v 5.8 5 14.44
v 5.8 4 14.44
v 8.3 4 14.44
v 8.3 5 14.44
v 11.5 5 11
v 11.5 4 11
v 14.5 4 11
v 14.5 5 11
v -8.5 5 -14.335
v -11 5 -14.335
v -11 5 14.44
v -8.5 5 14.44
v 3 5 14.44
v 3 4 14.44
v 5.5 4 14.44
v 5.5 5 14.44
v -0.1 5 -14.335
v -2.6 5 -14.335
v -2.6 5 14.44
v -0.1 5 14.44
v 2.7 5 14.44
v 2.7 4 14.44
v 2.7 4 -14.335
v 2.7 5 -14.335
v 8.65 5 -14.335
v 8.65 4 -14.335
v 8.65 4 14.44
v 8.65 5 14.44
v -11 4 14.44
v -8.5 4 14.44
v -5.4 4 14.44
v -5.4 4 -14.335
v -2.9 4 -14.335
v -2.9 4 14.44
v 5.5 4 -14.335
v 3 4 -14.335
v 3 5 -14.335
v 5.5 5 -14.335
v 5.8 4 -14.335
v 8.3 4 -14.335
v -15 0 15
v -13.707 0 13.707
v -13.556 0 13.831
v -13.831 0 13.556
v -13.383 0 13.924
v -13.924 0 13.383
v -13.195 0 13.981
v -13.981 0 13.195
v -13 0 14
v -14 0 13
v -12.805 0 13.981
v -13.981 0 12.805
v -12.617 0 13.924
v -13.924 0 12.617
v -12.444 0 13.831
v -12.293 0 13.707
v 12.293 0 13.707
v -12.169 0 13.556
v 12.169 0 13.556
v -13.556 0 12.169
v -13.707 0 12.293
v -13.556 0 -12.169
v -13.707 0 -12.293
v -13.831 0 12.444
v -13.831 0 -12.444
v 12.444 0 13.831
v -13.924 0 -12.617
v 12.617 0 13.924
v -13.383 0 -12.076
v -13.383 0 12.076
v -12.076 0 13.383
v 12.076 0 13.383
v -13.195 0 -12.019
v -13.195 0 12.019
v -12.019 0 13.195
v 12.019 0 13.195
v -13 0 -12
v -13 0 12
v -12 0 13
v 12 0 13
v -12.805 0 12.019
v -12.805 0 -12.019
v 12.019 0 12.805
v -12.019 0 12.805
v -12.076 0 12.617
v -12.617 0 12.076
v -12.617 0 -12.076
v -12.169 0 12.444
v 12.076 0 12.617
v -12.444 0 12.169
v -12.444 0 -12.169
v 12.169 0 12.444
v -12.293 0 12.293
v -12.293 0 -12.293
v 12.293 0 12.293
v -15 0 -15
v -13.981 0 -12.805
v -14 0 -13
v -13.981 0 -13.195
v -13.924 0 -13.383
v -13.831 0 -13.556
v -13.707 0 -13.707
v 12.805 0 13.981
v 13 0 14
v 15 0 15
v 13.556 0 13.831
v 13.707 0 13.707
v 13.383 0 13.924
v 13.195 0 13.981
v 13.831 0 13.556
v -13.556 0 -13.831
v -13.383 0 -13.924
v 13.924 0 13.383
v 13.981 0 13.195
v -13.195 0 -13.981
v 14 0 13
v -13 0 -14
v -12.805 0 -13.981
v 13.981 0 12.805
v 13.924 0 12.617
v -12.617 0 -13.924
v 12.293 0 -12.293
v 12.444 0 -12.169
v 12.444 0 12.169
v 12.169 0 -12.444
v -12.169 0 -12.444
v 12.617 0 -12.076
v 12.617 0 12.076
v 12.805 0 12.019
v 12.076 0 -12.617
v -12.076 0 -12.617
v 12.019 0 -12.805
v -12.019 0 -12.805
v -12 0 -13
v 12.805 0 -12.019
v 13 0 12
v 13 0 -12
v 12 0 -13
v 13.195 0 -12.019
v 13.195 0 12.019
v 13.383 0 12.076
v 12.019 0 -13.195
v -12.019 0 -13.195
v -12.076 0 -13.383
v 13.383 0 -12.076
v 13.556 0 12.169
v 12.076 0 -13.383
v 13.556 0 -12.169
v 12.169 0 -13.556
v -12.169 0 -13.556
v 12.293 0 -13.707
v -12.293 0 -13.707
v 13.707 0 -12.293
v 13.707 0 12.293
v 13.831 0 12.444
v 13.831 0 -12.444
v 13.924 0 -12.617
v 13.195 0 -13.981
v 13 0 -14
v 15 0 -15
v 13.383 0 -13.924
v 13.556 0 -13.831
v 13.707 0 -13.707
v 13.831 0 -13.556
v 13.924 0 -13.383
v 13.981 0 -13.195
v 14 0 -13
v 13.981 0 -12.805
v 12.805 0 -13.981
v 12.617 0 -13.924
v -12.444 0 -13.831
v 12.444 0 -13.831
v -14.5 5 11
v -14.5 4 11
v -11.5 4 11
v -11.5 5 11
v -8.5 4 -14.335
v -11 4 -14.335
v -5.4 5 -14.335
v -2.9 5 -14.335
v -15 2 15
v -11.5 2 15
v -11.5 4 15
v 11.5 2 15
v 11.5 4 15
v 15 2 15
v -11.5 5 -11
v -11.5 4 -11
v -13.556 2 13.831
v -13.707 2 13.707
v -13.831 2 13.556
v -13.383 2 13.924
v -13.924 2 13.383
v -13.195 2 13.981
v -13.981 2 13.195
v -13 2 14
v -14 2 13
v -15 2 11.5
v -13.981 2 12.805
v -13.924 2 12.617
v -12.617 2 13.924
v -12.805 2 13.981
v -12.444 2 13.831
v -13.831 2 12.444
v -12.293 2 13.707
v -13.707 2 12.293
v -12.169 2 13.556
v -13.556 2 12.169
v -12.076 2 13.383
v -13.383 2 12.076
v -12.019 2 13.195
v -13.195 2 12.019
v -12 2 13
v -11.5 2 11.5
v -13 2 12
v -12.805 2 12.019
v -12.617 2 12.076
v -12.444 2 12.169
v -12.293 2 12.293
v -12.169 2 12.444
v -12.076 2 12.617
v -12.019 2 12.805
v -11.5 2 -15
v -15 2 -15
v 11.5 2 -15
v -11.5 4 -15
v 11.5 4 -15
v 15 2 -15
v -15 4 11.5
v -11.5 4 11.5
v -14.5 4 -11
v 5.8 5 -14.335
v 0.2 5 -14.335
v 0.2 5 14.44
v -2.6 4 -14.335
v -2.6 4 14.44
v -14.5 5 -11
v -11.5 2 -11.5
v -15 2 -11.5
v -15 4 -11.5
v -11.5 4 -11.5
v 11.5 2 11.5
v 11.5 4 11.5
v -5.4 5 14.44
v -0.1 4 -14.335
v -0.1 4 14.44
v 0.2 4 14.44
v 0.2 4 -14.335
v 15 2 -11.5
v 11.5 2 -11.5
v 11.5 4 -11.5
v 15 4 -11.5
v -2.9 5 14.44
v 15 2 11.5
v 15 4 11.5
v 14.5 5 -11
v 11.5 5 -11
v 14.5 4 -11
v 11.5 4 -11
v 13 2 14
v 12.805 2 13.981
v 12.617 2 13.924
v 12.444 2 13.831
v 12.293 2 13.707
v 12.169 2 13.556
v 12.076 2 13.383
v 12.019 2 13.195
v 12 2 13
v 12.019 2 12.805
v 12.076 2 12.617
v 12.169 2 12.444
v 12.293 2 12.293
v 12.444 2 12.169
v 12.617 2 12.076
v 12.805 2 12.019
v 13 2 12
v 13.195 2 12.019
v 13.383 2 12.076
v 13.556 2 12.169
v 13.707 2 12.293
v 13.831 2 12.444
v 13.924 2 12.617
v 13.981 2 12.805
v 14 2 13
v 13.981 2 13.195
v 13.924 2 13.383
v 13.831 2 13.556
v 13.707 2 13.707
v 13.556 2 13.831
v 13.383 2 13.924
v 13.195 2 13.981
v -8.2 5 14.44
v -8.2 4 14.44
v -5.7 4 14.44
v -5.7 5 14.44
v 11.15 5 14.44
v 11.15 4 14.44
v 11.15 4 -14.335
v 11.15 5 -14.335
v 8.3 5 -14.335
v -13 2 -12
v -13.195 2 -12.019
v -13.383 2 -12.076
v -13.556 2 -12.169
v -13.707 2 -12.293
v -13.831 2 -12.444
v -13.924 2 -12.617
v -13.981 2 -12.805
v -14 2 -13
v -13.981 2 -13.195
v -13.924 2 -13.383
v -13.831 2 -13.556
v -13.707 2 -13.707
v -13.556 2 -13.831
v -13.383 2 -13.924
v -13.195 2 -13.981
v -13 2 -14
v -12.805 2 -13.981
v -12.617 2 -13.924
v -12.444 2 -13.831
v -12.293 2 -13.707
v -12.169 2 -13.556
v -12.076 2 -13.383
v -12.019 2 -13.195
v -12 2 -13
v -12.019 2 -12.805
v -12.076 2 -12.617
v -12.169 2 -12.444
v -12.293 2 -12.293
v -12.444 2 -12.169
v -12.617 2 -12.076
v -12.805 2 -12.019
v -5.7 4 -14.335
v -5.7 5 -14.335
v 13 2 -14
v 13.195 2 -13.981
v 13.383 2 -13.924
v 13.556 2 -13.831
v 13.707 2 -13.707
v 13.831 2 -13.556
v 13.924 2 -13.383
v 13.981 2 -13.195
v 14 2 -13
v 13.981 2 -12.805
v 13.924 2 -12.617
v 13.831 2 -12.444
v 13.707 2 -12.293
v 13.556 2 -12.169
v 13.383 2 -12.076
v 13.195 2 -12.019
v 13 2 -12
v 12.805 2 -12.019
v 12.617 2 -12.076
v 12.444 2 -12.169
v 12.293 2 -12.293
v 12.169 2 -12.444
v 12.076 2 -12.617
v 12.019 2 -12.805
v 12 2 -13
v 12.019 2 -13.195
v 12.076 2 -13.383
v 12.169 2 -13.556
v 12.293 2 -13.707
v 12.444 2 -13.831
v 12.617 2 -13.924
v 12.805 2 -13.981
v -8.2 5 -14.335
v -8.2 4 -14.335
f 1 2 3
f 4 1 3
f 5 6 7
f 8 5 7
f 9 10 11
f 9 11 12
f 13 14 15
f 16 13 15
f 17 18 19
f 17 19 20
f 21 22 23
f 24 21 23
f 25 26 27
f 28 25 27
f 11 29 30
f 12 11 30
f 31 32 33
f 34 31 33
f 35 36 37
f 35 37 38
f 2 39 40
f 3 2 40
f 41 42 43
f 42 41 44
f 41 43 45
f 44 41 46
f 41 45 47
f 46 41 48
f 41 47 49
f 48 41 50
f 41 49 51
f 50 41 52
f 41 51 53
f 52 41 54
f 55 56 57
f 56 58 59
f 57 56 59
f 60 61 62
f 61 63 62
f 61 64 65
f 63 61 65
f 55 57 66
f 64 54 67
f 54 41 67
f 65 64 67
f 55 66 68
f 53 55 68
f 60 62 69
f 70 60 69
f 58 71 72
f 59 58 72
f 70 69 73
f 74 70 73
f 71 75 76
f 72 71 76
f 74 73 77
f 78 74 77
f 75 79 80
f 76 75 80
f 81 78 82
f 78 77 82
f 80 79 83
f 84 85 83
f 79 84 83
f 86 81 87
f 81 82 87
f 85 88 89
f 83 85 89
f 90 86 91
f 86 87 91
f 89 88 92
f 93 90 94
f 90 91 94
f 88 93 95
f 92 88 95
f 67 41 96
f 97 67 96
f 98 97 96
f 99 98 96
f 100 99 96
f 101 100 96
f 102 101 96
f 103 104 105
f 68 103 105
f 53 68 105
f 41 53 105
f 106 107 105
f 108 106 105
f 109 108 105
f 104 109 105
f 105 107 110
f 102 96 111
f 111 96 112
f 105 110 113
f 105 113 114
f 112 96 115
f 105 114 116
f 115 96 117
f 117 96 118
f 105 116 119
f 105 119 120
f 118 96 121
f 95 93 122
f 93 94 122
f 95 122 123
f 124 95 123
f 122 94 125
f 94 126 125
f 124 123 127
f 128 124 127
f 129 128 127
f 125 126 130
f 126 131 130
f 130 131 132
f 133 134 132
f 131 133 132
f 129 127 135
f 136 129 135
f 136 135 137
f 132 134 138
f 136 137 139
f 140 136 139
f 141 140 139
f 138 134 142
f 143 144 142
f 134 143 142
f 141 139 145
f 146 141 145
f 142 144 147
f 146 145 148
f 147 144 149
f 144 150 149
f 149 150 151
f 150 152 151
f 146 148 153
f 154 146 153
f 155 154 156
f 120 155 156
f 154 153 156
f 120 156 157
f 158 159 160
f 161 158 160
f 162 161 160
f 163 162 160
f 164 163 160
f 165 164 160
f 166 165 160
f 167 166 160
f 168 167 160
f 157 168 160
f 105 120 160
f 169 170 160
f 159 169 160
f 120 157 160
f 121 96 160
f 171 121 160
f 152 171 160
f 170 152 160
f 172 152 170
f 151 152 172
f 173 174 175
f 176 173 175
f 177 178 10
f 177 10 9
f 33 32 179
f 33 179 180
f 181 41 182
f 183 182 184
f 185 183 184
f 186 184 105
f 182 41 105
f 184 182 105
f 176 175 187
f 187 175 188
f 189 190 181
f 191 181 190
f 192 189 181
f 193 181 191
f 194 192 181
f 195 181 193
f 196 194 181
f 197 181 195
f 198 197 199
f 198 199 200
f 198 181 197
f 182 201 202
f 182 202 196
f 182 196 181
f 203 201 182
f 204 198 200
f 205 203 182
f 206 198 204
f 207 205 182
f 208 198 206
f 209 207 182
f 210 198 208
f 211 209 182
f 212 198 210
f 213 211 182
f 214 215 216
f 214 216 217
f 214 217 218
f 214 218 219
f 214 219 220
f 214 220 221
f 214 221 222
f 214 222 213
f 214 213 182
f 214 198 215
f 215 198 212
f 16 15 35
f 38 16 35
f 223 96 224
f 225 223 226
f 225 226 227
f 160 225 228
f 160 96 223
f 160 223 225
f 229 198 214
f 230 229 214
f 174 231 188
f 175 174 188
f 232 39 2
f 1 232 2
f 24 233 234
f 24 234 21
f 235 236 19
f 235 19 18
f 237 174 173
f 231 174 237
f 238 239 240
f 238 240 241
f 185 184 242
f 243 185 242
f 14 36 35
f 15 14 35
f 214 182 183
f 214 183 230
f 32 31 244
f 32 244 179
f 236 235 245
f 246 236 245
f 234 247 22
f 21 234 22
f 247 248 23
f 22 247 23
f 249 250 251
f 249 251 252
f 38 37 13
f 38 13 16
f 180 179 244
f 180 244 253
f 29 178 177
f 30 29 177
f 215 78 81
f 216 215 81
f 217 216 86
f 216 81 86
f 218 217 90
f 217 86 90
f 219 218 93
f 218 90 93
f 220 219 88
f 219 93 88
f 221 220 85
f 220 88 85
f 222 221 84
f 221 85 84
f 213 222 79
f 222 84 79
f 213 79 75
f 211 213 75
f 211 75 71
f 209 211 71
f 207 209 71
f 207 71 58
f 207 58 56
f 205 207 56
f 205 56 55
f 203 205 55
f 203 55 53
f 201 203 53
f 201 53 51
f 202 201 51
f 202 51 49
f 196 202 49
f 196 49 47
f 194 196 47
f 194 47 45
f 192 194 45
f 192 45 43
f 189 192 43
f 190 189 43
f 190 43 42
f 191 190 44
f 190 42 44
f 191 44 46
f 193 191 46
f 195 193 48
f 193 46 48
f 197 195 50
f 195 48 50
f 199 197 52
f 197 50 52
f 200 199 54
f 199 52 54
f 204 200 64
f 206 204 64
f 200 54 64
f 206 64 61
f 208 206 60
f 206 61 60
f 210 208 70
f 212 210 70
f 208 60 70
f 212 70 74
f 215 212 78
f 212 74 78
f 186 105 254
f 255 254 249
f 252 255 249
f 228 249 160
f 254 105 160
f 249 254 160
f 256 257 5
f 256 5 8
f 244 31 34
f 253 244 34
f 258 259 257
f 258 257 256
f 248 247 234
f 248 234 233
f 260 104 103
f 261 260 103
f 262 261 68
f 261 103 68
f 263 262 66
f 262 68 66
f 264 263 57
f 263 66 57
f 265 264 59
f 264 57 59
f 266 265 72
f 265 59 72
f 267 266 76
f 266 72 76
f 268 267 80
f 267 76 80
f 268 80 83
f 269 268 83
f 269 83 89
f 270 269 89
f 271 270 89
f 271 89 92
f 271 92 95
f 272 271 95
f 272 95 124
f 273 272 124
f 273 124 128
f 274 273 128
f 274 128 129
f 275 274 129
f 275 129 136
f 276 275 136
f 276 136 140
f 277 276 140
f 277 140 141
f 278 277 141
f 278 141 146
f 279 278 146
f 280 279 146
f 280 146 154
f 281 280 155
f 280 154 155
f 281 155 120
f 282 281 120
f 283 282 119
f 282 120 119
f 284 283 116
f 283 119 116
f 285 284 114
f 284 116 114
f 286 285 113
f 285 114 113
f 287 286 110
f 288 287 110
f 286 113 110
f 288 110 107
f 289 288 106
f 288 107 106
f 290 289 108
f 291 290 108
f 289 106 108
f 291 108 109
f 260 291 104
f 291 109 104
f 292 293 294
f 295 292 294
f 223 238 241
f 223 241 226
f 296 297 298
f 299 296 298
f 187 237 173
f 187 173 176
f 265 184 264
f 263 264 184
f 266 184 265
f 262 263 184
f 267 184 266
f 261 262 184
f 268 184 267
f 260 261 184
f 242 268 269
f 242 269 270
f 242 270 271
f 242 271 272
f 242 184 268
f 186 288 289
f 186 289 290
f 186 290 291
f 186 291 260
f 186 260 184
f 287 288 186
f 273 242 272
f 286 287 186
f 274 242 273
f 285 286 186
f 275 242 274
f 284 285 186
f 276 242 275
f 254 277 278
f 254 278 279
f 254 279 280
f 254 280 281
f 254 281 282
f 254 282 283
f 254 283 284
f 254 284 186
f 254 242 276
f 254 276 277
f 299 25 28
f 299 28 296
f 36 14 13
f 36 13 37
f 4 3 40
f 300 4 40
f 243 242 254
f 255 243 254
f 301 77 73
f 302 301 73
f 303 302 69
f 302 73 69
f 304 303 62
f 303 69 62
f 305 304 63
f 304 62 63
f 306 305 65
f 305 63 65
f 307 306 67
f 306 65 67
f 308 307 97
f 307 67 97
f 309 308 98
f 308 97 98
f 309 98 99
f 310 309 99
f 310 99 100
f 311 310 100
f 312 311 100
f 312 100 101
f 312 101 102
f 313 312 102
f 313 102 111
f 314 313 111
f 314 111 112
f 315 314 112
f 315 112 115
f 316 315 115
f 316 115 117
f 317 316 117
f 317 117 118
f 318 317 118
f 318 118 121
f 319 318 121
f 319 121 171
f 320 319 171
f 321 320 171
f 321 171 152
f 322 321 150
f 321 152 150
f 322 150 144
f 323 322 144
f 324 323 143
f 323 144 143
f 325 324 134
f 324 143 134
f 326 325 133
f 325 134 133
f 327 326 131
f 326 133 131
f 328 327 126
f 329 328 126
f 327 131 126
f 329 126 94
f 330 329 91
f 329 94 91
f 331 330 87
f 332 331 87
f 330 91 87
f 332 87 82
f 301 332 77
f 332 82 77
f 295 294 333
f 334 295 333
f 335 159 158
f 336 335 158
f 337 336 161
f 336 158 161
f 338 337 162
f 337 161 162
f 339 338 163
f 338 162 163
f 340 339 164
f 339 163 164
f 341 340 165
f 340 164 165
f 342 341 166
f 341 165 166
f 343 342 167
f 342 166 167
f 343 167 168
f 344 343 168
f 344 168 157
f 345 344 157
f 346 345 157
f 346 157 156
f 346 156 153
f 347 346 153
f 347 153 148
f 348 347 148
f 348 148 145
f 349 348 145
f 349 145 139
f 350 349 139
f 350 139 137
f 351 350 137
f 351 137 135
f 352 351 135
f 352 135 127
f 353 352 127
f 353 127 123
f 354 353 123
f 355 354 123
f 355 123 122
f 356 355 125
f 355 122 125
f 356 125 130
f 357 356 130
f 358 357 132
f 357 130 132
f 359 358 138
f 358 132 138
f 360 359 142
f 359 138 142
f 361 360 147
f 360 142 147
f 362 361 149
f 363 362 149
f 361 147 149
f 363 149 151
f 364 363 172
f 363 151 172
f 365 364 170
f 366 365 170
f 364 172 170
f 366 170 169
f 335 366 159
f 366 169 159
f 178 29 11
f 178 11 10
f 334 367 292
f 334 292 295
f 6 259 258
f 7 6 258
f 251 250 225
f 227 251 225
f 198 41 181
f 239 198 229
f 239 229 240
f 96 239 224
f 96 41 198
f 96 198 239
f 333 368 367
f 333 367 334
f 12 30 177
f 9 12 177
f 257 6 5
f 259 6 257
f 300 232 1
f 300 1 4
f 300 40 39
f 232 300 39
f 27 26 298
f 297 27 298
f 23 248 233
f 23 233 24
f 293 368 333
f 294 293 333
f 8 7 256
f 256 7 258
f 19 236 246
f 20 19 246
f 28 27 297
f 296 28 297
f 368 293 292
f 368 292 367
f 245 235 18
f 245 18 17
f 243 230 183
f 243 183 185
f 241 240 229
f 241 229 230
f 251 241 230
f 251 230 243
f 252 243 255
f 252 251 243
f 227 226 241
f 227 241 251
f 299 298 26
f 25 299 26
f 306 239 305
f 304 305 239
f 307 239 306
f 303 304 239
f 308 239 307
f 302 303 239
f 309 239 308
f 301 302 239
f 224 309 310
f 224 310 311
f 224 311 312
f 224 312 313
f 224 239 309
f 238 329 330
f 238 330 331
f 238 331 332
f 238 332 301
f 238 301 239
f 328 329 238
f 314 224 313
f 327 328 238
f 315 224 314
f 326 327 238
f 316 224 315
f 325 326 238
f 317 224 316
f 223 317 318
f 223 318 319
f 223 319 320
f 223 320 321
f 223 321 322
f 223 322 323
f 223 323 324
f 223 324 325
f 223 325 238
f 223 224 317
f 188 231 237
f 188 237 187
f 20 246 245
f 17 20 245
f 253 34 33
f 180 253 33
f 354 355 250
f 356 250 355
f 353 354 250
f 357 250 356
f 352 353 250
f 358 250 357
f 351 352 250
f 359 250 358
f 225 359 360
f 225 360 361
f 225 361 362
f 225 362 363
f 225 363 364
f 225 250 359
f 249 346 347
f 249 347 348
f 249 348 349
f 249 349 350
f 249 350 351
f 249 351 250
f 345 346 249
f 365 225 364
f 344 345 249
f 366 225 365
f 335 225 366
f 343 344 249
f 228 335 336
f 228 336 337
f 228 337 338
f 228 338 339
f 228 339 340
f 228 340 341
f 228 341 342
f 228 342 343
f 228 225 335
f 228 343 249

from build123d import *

# Parameters (mm, degrees)
SKETCH1_W                   = 30
SKETCH1_H                   = 30
BOSS_EXTRUDE1_DEPTH         = 4
CUT_EXTRUDE_THIN2_START     = -2
CUT_EXTRUDE_THIN2_OUTLINE_W = 3.5
CUT_EXTRUDE_THIN2_OUTLINE_H = 3.5
CUT_EXTRUDE_THIN2_DEPTH     = 2
SKETCH6_W                   = 3
SKETCH6_H                   = 22
BOSS_EXTRUDE2_DEPTH         = 1
SKETCH6_W_2                 = 2.5
SKETCH6_H_2                 = 28.774594564
BOSS_EXTRUDE2_2_DEPTH       = 1
BOSS_EXTRUDE2_3_DEPTH       = 1
BOSS_EXTRUDE2_4_DEPTH       = 1
BOSS_EXTRUDE2_5_DEPTH       = 1
BOSS_EXTRUDE2_6_DEPTH       = 1
BOSS_EXTRUDE2_7_DEPTH       = 1
BOSS_EXTRUDE2_8_DEPTH       = 1
BOSS_EXTRUDE2_9_DEPTH       = 1
BOSS_EXTRUDE2_10_DEPTH      = 1
SKETCH7_R                   = 1
CUT_EXTRUDE1_DEPTH          = 22.794494718


# Read off the part's stored shape, not the designer's step: Cut-Extrude-Thin2
with BuildPart() as part:
    # Sketch1 → Boss-Extrude1 (new body)
    with BuildSketch(Plane(origin=(0, 0, 0), x_dir=(1, 0, 0), z_dir=(0, 1, 0))):
        Rectangle(SKETCH1_W, SKETCH1_H)
    extrude(amount=BOSS_EXTRUDE1_DEPTH)

    # Cut-Extrude-Thin2 outline → Cut-Extrude-Thin2 (cut)
    with BuildSketch(Plane(origin=(0, 4, 0), x_dir=(1, 0, 0), z_dir=(0, 1, 0)).offset(CUT_EXTRUDE_THIN2_START)):
        with Locations((-13.25, -13.25)):
            Rectangle(CUT_EXTRUDE_THIN2_OUTLINE_W, CUT_EXTRUDE_THIN2_OUTLINE_H)
        with Locations((13.25, -13.25)):
            Rectangle(CUT_EXTRUDE_THIN2_OUTLINE_W, CUT_EXTRUDE_THIN2_OUTLINE_H)
        with Locations((-13.25, 13.25)):
            Rectangle(CUT_EXTRUDE_THIN2_OUTLINE_W, CUT_EXTRUDE_THIN2_OUTLINE_H)
        with Locations((13.25, 13.25)):
            Rectangle(CUT_EXTRUDE_THIN2_OUTLINE_W, CUT_EXTRUDE_THIN2_OUTLINE_H)
    extrude(amount=CUT_EXTRUDE_THIN2_DEPTH, mode=Mode.SUBTRACT)

    # Sketch7 → Cut-Extrude1 (cut, through all)
    with BuildSketch(Plane.XZ):
        with Locations(Location((-13, 13, 0), (0, 0, 270))):
            Circle(SKETCH7_R)
        with Locations(Location((13, 13, 0), (0, 0, 90))):
            Circle(SKETCH7_R)
        with Locations(Location((13, -13, 0), (0, 0, 270))):
            Circle(SKETCH7_R)
        with Locations(Location((-13, -13, 0), (0, 0, 90))):
            Circle(SKETCH7_R)
    extrude(amount=-CUT_EXTRUDE1_DEPTH, mode=Mode.SUBTRACT)


with BuildPart() as body_2:
    # Sketch6 → Boss-Extrude2 (new body)
    with BuildSketch(Plane(origin=(0, 4, 0), x_dir=(1, 0, 0), z_dir=(0, 1, 0))):
        with Locations((-13, 0)):
            Rectangle(SKETCH6_W, SKETCH6_H)
    extrude(amount=BOSS_EXTRUDE2_DEPTH)


with BuildPart() as body_3:
    # Sketch6 → Boss-Extrude2 2 (new body)
    with BuildSketch(Plane(origin=(0, 4, 0), x_dir=(1, 0, 0), z_dir=(0, 1, 0))):
        with Locations((-9.75, -0.052758691)):
            Rectangle(SKETCH6_W_2, SKETCH6_H_2)
    extrude(amount=BOSS_EXTRUDE2_2_DEPTH)


with BuildPart() as body_4:
    # Sketch6 → Boss-Extrude2 3 (new body)
    with BuildSketch(Plane(origin=(0, 4, 0), x_dir=(1, 0, 0), z_dir=(0, 1, 0))):
        with Locations((-6.95, -0.052758691)):
            Rectangle(SKETCH6_W_2, SKETCH6_H_2)
    extrude(amount=BOSS_EXTRUDE2_3_DEPTH)


with BuildPart() as body_5:
    # Sketch6 → Boss-Extrude2 4 (new body)
    with BuildSketch(Plane(origin=(0, 4, 0), x_dir=(1, 0, 0), z_dir=(0, 1, 0))):
        with Locations((-4.15, -0.052758691)):
            Rectangle(SKETCH6_W_2, SKETCH6_H_2)
    extrude(amount=BOSS_EXTRUDE2_4_DEPTH)


with BuildPart() as body_6:
    # Sketch6 → Boss-Extrude2 5 (new body)
    with BuildSketch(Plane(origin=(0, 4, 0), x_dir=(1, 0, 0), z_dir=(0, 1, 0))):
        with Locations((-1.35, -0.052758691)):
            Rectangle(SKETCH6_W_2, SKETCH6_H_2)
    extrude(amount=BOSS_EXTRUDE2_5_DEPTH)


with BuildPart() as body_7:
    # Sketch6 → Boss-Extrude2 6 (new body)
    with BuildSketch(Plane(origin=(0, 4, 0), x_dir=(1, 0, 0), z_dir=(0, 1, 0))):
        with Locations((1.45, -0.052758691)):
            Rectangle(SKETCH6_W_2, SKETCH6_H_2)
    extrude(amount=BOSS_EXTRUDE2_6_DEPTH)


with BuildPart() as body_8:
    # Sketch6 → Boss-Extrude2 7 (new body)
    with BuildSketch(Plane(origin=(0, 4, 0), x_dir=(1, 0, 0), z_dir=(0, 1, 0))):
        with Locations((4.25, -0.052758691)):
            Rectangle(SKETCH6_W_2, SKETCH6_H_2)
    extrude(amount=BOSS_EXTRUDE2_7_DEPTH)


with BuildPart() as body_9:
    # Sketch6 → Boss-Extrude2 8 (new body)
    with BuildSketch(Plane(origin=(0, 4, 0), x_dir=(1, 0, 0), z_dir=(0, 1, 0))):
        Polygon((8.3, -14.440055973), (8.3, 14.334538591), (7.713421102, 14.334538591), (5.8, 14.334538591), (5.8, -14.440055973), (7.713421102, -14.440055973), align=None)
    extrude(amount=BOSS_EXTRUDE2_8_DEPTH)


with BuildPart() as body_10:
    # Sketch6 → Boss-Extrude2 9 (new body)
    with BuildSketch(Plane(origin=(0, 4, 0), x_dir=(1, 0, 0), z_dir=(0, 1, 0))):
        Polygon((10.88715437, 14.334538591), (8.65, 14.334538591), (8.65, -14.440055973), (11.15, -14.440055973), (11.15, 14.334538591), align=None)
    extrude(amount=BOSS_EXTRUDE2_9_DEPTH)


with BuildPart() as body_11:
    # Sketch6 → Boss-Extrude2 10 (new body)
    with BuildSketch(Plane(origin=(0, 4, 0), x_dir=(1, 0, 0), z_dir=(0, 1, 0))):
        with Locations((13, 0)):
            Rectangle(SKETCH6_W, SKETCH6_H)
    extrude(amount=BOSS_EXTRUDE2_10_DEPTH)


solid = Compound([part.part, body_2.part, body_3.part, body_4.part, body_5.part, body_6.part, body_7.part, body_8.part, body_9.part, body_10.part, body_11.part])
